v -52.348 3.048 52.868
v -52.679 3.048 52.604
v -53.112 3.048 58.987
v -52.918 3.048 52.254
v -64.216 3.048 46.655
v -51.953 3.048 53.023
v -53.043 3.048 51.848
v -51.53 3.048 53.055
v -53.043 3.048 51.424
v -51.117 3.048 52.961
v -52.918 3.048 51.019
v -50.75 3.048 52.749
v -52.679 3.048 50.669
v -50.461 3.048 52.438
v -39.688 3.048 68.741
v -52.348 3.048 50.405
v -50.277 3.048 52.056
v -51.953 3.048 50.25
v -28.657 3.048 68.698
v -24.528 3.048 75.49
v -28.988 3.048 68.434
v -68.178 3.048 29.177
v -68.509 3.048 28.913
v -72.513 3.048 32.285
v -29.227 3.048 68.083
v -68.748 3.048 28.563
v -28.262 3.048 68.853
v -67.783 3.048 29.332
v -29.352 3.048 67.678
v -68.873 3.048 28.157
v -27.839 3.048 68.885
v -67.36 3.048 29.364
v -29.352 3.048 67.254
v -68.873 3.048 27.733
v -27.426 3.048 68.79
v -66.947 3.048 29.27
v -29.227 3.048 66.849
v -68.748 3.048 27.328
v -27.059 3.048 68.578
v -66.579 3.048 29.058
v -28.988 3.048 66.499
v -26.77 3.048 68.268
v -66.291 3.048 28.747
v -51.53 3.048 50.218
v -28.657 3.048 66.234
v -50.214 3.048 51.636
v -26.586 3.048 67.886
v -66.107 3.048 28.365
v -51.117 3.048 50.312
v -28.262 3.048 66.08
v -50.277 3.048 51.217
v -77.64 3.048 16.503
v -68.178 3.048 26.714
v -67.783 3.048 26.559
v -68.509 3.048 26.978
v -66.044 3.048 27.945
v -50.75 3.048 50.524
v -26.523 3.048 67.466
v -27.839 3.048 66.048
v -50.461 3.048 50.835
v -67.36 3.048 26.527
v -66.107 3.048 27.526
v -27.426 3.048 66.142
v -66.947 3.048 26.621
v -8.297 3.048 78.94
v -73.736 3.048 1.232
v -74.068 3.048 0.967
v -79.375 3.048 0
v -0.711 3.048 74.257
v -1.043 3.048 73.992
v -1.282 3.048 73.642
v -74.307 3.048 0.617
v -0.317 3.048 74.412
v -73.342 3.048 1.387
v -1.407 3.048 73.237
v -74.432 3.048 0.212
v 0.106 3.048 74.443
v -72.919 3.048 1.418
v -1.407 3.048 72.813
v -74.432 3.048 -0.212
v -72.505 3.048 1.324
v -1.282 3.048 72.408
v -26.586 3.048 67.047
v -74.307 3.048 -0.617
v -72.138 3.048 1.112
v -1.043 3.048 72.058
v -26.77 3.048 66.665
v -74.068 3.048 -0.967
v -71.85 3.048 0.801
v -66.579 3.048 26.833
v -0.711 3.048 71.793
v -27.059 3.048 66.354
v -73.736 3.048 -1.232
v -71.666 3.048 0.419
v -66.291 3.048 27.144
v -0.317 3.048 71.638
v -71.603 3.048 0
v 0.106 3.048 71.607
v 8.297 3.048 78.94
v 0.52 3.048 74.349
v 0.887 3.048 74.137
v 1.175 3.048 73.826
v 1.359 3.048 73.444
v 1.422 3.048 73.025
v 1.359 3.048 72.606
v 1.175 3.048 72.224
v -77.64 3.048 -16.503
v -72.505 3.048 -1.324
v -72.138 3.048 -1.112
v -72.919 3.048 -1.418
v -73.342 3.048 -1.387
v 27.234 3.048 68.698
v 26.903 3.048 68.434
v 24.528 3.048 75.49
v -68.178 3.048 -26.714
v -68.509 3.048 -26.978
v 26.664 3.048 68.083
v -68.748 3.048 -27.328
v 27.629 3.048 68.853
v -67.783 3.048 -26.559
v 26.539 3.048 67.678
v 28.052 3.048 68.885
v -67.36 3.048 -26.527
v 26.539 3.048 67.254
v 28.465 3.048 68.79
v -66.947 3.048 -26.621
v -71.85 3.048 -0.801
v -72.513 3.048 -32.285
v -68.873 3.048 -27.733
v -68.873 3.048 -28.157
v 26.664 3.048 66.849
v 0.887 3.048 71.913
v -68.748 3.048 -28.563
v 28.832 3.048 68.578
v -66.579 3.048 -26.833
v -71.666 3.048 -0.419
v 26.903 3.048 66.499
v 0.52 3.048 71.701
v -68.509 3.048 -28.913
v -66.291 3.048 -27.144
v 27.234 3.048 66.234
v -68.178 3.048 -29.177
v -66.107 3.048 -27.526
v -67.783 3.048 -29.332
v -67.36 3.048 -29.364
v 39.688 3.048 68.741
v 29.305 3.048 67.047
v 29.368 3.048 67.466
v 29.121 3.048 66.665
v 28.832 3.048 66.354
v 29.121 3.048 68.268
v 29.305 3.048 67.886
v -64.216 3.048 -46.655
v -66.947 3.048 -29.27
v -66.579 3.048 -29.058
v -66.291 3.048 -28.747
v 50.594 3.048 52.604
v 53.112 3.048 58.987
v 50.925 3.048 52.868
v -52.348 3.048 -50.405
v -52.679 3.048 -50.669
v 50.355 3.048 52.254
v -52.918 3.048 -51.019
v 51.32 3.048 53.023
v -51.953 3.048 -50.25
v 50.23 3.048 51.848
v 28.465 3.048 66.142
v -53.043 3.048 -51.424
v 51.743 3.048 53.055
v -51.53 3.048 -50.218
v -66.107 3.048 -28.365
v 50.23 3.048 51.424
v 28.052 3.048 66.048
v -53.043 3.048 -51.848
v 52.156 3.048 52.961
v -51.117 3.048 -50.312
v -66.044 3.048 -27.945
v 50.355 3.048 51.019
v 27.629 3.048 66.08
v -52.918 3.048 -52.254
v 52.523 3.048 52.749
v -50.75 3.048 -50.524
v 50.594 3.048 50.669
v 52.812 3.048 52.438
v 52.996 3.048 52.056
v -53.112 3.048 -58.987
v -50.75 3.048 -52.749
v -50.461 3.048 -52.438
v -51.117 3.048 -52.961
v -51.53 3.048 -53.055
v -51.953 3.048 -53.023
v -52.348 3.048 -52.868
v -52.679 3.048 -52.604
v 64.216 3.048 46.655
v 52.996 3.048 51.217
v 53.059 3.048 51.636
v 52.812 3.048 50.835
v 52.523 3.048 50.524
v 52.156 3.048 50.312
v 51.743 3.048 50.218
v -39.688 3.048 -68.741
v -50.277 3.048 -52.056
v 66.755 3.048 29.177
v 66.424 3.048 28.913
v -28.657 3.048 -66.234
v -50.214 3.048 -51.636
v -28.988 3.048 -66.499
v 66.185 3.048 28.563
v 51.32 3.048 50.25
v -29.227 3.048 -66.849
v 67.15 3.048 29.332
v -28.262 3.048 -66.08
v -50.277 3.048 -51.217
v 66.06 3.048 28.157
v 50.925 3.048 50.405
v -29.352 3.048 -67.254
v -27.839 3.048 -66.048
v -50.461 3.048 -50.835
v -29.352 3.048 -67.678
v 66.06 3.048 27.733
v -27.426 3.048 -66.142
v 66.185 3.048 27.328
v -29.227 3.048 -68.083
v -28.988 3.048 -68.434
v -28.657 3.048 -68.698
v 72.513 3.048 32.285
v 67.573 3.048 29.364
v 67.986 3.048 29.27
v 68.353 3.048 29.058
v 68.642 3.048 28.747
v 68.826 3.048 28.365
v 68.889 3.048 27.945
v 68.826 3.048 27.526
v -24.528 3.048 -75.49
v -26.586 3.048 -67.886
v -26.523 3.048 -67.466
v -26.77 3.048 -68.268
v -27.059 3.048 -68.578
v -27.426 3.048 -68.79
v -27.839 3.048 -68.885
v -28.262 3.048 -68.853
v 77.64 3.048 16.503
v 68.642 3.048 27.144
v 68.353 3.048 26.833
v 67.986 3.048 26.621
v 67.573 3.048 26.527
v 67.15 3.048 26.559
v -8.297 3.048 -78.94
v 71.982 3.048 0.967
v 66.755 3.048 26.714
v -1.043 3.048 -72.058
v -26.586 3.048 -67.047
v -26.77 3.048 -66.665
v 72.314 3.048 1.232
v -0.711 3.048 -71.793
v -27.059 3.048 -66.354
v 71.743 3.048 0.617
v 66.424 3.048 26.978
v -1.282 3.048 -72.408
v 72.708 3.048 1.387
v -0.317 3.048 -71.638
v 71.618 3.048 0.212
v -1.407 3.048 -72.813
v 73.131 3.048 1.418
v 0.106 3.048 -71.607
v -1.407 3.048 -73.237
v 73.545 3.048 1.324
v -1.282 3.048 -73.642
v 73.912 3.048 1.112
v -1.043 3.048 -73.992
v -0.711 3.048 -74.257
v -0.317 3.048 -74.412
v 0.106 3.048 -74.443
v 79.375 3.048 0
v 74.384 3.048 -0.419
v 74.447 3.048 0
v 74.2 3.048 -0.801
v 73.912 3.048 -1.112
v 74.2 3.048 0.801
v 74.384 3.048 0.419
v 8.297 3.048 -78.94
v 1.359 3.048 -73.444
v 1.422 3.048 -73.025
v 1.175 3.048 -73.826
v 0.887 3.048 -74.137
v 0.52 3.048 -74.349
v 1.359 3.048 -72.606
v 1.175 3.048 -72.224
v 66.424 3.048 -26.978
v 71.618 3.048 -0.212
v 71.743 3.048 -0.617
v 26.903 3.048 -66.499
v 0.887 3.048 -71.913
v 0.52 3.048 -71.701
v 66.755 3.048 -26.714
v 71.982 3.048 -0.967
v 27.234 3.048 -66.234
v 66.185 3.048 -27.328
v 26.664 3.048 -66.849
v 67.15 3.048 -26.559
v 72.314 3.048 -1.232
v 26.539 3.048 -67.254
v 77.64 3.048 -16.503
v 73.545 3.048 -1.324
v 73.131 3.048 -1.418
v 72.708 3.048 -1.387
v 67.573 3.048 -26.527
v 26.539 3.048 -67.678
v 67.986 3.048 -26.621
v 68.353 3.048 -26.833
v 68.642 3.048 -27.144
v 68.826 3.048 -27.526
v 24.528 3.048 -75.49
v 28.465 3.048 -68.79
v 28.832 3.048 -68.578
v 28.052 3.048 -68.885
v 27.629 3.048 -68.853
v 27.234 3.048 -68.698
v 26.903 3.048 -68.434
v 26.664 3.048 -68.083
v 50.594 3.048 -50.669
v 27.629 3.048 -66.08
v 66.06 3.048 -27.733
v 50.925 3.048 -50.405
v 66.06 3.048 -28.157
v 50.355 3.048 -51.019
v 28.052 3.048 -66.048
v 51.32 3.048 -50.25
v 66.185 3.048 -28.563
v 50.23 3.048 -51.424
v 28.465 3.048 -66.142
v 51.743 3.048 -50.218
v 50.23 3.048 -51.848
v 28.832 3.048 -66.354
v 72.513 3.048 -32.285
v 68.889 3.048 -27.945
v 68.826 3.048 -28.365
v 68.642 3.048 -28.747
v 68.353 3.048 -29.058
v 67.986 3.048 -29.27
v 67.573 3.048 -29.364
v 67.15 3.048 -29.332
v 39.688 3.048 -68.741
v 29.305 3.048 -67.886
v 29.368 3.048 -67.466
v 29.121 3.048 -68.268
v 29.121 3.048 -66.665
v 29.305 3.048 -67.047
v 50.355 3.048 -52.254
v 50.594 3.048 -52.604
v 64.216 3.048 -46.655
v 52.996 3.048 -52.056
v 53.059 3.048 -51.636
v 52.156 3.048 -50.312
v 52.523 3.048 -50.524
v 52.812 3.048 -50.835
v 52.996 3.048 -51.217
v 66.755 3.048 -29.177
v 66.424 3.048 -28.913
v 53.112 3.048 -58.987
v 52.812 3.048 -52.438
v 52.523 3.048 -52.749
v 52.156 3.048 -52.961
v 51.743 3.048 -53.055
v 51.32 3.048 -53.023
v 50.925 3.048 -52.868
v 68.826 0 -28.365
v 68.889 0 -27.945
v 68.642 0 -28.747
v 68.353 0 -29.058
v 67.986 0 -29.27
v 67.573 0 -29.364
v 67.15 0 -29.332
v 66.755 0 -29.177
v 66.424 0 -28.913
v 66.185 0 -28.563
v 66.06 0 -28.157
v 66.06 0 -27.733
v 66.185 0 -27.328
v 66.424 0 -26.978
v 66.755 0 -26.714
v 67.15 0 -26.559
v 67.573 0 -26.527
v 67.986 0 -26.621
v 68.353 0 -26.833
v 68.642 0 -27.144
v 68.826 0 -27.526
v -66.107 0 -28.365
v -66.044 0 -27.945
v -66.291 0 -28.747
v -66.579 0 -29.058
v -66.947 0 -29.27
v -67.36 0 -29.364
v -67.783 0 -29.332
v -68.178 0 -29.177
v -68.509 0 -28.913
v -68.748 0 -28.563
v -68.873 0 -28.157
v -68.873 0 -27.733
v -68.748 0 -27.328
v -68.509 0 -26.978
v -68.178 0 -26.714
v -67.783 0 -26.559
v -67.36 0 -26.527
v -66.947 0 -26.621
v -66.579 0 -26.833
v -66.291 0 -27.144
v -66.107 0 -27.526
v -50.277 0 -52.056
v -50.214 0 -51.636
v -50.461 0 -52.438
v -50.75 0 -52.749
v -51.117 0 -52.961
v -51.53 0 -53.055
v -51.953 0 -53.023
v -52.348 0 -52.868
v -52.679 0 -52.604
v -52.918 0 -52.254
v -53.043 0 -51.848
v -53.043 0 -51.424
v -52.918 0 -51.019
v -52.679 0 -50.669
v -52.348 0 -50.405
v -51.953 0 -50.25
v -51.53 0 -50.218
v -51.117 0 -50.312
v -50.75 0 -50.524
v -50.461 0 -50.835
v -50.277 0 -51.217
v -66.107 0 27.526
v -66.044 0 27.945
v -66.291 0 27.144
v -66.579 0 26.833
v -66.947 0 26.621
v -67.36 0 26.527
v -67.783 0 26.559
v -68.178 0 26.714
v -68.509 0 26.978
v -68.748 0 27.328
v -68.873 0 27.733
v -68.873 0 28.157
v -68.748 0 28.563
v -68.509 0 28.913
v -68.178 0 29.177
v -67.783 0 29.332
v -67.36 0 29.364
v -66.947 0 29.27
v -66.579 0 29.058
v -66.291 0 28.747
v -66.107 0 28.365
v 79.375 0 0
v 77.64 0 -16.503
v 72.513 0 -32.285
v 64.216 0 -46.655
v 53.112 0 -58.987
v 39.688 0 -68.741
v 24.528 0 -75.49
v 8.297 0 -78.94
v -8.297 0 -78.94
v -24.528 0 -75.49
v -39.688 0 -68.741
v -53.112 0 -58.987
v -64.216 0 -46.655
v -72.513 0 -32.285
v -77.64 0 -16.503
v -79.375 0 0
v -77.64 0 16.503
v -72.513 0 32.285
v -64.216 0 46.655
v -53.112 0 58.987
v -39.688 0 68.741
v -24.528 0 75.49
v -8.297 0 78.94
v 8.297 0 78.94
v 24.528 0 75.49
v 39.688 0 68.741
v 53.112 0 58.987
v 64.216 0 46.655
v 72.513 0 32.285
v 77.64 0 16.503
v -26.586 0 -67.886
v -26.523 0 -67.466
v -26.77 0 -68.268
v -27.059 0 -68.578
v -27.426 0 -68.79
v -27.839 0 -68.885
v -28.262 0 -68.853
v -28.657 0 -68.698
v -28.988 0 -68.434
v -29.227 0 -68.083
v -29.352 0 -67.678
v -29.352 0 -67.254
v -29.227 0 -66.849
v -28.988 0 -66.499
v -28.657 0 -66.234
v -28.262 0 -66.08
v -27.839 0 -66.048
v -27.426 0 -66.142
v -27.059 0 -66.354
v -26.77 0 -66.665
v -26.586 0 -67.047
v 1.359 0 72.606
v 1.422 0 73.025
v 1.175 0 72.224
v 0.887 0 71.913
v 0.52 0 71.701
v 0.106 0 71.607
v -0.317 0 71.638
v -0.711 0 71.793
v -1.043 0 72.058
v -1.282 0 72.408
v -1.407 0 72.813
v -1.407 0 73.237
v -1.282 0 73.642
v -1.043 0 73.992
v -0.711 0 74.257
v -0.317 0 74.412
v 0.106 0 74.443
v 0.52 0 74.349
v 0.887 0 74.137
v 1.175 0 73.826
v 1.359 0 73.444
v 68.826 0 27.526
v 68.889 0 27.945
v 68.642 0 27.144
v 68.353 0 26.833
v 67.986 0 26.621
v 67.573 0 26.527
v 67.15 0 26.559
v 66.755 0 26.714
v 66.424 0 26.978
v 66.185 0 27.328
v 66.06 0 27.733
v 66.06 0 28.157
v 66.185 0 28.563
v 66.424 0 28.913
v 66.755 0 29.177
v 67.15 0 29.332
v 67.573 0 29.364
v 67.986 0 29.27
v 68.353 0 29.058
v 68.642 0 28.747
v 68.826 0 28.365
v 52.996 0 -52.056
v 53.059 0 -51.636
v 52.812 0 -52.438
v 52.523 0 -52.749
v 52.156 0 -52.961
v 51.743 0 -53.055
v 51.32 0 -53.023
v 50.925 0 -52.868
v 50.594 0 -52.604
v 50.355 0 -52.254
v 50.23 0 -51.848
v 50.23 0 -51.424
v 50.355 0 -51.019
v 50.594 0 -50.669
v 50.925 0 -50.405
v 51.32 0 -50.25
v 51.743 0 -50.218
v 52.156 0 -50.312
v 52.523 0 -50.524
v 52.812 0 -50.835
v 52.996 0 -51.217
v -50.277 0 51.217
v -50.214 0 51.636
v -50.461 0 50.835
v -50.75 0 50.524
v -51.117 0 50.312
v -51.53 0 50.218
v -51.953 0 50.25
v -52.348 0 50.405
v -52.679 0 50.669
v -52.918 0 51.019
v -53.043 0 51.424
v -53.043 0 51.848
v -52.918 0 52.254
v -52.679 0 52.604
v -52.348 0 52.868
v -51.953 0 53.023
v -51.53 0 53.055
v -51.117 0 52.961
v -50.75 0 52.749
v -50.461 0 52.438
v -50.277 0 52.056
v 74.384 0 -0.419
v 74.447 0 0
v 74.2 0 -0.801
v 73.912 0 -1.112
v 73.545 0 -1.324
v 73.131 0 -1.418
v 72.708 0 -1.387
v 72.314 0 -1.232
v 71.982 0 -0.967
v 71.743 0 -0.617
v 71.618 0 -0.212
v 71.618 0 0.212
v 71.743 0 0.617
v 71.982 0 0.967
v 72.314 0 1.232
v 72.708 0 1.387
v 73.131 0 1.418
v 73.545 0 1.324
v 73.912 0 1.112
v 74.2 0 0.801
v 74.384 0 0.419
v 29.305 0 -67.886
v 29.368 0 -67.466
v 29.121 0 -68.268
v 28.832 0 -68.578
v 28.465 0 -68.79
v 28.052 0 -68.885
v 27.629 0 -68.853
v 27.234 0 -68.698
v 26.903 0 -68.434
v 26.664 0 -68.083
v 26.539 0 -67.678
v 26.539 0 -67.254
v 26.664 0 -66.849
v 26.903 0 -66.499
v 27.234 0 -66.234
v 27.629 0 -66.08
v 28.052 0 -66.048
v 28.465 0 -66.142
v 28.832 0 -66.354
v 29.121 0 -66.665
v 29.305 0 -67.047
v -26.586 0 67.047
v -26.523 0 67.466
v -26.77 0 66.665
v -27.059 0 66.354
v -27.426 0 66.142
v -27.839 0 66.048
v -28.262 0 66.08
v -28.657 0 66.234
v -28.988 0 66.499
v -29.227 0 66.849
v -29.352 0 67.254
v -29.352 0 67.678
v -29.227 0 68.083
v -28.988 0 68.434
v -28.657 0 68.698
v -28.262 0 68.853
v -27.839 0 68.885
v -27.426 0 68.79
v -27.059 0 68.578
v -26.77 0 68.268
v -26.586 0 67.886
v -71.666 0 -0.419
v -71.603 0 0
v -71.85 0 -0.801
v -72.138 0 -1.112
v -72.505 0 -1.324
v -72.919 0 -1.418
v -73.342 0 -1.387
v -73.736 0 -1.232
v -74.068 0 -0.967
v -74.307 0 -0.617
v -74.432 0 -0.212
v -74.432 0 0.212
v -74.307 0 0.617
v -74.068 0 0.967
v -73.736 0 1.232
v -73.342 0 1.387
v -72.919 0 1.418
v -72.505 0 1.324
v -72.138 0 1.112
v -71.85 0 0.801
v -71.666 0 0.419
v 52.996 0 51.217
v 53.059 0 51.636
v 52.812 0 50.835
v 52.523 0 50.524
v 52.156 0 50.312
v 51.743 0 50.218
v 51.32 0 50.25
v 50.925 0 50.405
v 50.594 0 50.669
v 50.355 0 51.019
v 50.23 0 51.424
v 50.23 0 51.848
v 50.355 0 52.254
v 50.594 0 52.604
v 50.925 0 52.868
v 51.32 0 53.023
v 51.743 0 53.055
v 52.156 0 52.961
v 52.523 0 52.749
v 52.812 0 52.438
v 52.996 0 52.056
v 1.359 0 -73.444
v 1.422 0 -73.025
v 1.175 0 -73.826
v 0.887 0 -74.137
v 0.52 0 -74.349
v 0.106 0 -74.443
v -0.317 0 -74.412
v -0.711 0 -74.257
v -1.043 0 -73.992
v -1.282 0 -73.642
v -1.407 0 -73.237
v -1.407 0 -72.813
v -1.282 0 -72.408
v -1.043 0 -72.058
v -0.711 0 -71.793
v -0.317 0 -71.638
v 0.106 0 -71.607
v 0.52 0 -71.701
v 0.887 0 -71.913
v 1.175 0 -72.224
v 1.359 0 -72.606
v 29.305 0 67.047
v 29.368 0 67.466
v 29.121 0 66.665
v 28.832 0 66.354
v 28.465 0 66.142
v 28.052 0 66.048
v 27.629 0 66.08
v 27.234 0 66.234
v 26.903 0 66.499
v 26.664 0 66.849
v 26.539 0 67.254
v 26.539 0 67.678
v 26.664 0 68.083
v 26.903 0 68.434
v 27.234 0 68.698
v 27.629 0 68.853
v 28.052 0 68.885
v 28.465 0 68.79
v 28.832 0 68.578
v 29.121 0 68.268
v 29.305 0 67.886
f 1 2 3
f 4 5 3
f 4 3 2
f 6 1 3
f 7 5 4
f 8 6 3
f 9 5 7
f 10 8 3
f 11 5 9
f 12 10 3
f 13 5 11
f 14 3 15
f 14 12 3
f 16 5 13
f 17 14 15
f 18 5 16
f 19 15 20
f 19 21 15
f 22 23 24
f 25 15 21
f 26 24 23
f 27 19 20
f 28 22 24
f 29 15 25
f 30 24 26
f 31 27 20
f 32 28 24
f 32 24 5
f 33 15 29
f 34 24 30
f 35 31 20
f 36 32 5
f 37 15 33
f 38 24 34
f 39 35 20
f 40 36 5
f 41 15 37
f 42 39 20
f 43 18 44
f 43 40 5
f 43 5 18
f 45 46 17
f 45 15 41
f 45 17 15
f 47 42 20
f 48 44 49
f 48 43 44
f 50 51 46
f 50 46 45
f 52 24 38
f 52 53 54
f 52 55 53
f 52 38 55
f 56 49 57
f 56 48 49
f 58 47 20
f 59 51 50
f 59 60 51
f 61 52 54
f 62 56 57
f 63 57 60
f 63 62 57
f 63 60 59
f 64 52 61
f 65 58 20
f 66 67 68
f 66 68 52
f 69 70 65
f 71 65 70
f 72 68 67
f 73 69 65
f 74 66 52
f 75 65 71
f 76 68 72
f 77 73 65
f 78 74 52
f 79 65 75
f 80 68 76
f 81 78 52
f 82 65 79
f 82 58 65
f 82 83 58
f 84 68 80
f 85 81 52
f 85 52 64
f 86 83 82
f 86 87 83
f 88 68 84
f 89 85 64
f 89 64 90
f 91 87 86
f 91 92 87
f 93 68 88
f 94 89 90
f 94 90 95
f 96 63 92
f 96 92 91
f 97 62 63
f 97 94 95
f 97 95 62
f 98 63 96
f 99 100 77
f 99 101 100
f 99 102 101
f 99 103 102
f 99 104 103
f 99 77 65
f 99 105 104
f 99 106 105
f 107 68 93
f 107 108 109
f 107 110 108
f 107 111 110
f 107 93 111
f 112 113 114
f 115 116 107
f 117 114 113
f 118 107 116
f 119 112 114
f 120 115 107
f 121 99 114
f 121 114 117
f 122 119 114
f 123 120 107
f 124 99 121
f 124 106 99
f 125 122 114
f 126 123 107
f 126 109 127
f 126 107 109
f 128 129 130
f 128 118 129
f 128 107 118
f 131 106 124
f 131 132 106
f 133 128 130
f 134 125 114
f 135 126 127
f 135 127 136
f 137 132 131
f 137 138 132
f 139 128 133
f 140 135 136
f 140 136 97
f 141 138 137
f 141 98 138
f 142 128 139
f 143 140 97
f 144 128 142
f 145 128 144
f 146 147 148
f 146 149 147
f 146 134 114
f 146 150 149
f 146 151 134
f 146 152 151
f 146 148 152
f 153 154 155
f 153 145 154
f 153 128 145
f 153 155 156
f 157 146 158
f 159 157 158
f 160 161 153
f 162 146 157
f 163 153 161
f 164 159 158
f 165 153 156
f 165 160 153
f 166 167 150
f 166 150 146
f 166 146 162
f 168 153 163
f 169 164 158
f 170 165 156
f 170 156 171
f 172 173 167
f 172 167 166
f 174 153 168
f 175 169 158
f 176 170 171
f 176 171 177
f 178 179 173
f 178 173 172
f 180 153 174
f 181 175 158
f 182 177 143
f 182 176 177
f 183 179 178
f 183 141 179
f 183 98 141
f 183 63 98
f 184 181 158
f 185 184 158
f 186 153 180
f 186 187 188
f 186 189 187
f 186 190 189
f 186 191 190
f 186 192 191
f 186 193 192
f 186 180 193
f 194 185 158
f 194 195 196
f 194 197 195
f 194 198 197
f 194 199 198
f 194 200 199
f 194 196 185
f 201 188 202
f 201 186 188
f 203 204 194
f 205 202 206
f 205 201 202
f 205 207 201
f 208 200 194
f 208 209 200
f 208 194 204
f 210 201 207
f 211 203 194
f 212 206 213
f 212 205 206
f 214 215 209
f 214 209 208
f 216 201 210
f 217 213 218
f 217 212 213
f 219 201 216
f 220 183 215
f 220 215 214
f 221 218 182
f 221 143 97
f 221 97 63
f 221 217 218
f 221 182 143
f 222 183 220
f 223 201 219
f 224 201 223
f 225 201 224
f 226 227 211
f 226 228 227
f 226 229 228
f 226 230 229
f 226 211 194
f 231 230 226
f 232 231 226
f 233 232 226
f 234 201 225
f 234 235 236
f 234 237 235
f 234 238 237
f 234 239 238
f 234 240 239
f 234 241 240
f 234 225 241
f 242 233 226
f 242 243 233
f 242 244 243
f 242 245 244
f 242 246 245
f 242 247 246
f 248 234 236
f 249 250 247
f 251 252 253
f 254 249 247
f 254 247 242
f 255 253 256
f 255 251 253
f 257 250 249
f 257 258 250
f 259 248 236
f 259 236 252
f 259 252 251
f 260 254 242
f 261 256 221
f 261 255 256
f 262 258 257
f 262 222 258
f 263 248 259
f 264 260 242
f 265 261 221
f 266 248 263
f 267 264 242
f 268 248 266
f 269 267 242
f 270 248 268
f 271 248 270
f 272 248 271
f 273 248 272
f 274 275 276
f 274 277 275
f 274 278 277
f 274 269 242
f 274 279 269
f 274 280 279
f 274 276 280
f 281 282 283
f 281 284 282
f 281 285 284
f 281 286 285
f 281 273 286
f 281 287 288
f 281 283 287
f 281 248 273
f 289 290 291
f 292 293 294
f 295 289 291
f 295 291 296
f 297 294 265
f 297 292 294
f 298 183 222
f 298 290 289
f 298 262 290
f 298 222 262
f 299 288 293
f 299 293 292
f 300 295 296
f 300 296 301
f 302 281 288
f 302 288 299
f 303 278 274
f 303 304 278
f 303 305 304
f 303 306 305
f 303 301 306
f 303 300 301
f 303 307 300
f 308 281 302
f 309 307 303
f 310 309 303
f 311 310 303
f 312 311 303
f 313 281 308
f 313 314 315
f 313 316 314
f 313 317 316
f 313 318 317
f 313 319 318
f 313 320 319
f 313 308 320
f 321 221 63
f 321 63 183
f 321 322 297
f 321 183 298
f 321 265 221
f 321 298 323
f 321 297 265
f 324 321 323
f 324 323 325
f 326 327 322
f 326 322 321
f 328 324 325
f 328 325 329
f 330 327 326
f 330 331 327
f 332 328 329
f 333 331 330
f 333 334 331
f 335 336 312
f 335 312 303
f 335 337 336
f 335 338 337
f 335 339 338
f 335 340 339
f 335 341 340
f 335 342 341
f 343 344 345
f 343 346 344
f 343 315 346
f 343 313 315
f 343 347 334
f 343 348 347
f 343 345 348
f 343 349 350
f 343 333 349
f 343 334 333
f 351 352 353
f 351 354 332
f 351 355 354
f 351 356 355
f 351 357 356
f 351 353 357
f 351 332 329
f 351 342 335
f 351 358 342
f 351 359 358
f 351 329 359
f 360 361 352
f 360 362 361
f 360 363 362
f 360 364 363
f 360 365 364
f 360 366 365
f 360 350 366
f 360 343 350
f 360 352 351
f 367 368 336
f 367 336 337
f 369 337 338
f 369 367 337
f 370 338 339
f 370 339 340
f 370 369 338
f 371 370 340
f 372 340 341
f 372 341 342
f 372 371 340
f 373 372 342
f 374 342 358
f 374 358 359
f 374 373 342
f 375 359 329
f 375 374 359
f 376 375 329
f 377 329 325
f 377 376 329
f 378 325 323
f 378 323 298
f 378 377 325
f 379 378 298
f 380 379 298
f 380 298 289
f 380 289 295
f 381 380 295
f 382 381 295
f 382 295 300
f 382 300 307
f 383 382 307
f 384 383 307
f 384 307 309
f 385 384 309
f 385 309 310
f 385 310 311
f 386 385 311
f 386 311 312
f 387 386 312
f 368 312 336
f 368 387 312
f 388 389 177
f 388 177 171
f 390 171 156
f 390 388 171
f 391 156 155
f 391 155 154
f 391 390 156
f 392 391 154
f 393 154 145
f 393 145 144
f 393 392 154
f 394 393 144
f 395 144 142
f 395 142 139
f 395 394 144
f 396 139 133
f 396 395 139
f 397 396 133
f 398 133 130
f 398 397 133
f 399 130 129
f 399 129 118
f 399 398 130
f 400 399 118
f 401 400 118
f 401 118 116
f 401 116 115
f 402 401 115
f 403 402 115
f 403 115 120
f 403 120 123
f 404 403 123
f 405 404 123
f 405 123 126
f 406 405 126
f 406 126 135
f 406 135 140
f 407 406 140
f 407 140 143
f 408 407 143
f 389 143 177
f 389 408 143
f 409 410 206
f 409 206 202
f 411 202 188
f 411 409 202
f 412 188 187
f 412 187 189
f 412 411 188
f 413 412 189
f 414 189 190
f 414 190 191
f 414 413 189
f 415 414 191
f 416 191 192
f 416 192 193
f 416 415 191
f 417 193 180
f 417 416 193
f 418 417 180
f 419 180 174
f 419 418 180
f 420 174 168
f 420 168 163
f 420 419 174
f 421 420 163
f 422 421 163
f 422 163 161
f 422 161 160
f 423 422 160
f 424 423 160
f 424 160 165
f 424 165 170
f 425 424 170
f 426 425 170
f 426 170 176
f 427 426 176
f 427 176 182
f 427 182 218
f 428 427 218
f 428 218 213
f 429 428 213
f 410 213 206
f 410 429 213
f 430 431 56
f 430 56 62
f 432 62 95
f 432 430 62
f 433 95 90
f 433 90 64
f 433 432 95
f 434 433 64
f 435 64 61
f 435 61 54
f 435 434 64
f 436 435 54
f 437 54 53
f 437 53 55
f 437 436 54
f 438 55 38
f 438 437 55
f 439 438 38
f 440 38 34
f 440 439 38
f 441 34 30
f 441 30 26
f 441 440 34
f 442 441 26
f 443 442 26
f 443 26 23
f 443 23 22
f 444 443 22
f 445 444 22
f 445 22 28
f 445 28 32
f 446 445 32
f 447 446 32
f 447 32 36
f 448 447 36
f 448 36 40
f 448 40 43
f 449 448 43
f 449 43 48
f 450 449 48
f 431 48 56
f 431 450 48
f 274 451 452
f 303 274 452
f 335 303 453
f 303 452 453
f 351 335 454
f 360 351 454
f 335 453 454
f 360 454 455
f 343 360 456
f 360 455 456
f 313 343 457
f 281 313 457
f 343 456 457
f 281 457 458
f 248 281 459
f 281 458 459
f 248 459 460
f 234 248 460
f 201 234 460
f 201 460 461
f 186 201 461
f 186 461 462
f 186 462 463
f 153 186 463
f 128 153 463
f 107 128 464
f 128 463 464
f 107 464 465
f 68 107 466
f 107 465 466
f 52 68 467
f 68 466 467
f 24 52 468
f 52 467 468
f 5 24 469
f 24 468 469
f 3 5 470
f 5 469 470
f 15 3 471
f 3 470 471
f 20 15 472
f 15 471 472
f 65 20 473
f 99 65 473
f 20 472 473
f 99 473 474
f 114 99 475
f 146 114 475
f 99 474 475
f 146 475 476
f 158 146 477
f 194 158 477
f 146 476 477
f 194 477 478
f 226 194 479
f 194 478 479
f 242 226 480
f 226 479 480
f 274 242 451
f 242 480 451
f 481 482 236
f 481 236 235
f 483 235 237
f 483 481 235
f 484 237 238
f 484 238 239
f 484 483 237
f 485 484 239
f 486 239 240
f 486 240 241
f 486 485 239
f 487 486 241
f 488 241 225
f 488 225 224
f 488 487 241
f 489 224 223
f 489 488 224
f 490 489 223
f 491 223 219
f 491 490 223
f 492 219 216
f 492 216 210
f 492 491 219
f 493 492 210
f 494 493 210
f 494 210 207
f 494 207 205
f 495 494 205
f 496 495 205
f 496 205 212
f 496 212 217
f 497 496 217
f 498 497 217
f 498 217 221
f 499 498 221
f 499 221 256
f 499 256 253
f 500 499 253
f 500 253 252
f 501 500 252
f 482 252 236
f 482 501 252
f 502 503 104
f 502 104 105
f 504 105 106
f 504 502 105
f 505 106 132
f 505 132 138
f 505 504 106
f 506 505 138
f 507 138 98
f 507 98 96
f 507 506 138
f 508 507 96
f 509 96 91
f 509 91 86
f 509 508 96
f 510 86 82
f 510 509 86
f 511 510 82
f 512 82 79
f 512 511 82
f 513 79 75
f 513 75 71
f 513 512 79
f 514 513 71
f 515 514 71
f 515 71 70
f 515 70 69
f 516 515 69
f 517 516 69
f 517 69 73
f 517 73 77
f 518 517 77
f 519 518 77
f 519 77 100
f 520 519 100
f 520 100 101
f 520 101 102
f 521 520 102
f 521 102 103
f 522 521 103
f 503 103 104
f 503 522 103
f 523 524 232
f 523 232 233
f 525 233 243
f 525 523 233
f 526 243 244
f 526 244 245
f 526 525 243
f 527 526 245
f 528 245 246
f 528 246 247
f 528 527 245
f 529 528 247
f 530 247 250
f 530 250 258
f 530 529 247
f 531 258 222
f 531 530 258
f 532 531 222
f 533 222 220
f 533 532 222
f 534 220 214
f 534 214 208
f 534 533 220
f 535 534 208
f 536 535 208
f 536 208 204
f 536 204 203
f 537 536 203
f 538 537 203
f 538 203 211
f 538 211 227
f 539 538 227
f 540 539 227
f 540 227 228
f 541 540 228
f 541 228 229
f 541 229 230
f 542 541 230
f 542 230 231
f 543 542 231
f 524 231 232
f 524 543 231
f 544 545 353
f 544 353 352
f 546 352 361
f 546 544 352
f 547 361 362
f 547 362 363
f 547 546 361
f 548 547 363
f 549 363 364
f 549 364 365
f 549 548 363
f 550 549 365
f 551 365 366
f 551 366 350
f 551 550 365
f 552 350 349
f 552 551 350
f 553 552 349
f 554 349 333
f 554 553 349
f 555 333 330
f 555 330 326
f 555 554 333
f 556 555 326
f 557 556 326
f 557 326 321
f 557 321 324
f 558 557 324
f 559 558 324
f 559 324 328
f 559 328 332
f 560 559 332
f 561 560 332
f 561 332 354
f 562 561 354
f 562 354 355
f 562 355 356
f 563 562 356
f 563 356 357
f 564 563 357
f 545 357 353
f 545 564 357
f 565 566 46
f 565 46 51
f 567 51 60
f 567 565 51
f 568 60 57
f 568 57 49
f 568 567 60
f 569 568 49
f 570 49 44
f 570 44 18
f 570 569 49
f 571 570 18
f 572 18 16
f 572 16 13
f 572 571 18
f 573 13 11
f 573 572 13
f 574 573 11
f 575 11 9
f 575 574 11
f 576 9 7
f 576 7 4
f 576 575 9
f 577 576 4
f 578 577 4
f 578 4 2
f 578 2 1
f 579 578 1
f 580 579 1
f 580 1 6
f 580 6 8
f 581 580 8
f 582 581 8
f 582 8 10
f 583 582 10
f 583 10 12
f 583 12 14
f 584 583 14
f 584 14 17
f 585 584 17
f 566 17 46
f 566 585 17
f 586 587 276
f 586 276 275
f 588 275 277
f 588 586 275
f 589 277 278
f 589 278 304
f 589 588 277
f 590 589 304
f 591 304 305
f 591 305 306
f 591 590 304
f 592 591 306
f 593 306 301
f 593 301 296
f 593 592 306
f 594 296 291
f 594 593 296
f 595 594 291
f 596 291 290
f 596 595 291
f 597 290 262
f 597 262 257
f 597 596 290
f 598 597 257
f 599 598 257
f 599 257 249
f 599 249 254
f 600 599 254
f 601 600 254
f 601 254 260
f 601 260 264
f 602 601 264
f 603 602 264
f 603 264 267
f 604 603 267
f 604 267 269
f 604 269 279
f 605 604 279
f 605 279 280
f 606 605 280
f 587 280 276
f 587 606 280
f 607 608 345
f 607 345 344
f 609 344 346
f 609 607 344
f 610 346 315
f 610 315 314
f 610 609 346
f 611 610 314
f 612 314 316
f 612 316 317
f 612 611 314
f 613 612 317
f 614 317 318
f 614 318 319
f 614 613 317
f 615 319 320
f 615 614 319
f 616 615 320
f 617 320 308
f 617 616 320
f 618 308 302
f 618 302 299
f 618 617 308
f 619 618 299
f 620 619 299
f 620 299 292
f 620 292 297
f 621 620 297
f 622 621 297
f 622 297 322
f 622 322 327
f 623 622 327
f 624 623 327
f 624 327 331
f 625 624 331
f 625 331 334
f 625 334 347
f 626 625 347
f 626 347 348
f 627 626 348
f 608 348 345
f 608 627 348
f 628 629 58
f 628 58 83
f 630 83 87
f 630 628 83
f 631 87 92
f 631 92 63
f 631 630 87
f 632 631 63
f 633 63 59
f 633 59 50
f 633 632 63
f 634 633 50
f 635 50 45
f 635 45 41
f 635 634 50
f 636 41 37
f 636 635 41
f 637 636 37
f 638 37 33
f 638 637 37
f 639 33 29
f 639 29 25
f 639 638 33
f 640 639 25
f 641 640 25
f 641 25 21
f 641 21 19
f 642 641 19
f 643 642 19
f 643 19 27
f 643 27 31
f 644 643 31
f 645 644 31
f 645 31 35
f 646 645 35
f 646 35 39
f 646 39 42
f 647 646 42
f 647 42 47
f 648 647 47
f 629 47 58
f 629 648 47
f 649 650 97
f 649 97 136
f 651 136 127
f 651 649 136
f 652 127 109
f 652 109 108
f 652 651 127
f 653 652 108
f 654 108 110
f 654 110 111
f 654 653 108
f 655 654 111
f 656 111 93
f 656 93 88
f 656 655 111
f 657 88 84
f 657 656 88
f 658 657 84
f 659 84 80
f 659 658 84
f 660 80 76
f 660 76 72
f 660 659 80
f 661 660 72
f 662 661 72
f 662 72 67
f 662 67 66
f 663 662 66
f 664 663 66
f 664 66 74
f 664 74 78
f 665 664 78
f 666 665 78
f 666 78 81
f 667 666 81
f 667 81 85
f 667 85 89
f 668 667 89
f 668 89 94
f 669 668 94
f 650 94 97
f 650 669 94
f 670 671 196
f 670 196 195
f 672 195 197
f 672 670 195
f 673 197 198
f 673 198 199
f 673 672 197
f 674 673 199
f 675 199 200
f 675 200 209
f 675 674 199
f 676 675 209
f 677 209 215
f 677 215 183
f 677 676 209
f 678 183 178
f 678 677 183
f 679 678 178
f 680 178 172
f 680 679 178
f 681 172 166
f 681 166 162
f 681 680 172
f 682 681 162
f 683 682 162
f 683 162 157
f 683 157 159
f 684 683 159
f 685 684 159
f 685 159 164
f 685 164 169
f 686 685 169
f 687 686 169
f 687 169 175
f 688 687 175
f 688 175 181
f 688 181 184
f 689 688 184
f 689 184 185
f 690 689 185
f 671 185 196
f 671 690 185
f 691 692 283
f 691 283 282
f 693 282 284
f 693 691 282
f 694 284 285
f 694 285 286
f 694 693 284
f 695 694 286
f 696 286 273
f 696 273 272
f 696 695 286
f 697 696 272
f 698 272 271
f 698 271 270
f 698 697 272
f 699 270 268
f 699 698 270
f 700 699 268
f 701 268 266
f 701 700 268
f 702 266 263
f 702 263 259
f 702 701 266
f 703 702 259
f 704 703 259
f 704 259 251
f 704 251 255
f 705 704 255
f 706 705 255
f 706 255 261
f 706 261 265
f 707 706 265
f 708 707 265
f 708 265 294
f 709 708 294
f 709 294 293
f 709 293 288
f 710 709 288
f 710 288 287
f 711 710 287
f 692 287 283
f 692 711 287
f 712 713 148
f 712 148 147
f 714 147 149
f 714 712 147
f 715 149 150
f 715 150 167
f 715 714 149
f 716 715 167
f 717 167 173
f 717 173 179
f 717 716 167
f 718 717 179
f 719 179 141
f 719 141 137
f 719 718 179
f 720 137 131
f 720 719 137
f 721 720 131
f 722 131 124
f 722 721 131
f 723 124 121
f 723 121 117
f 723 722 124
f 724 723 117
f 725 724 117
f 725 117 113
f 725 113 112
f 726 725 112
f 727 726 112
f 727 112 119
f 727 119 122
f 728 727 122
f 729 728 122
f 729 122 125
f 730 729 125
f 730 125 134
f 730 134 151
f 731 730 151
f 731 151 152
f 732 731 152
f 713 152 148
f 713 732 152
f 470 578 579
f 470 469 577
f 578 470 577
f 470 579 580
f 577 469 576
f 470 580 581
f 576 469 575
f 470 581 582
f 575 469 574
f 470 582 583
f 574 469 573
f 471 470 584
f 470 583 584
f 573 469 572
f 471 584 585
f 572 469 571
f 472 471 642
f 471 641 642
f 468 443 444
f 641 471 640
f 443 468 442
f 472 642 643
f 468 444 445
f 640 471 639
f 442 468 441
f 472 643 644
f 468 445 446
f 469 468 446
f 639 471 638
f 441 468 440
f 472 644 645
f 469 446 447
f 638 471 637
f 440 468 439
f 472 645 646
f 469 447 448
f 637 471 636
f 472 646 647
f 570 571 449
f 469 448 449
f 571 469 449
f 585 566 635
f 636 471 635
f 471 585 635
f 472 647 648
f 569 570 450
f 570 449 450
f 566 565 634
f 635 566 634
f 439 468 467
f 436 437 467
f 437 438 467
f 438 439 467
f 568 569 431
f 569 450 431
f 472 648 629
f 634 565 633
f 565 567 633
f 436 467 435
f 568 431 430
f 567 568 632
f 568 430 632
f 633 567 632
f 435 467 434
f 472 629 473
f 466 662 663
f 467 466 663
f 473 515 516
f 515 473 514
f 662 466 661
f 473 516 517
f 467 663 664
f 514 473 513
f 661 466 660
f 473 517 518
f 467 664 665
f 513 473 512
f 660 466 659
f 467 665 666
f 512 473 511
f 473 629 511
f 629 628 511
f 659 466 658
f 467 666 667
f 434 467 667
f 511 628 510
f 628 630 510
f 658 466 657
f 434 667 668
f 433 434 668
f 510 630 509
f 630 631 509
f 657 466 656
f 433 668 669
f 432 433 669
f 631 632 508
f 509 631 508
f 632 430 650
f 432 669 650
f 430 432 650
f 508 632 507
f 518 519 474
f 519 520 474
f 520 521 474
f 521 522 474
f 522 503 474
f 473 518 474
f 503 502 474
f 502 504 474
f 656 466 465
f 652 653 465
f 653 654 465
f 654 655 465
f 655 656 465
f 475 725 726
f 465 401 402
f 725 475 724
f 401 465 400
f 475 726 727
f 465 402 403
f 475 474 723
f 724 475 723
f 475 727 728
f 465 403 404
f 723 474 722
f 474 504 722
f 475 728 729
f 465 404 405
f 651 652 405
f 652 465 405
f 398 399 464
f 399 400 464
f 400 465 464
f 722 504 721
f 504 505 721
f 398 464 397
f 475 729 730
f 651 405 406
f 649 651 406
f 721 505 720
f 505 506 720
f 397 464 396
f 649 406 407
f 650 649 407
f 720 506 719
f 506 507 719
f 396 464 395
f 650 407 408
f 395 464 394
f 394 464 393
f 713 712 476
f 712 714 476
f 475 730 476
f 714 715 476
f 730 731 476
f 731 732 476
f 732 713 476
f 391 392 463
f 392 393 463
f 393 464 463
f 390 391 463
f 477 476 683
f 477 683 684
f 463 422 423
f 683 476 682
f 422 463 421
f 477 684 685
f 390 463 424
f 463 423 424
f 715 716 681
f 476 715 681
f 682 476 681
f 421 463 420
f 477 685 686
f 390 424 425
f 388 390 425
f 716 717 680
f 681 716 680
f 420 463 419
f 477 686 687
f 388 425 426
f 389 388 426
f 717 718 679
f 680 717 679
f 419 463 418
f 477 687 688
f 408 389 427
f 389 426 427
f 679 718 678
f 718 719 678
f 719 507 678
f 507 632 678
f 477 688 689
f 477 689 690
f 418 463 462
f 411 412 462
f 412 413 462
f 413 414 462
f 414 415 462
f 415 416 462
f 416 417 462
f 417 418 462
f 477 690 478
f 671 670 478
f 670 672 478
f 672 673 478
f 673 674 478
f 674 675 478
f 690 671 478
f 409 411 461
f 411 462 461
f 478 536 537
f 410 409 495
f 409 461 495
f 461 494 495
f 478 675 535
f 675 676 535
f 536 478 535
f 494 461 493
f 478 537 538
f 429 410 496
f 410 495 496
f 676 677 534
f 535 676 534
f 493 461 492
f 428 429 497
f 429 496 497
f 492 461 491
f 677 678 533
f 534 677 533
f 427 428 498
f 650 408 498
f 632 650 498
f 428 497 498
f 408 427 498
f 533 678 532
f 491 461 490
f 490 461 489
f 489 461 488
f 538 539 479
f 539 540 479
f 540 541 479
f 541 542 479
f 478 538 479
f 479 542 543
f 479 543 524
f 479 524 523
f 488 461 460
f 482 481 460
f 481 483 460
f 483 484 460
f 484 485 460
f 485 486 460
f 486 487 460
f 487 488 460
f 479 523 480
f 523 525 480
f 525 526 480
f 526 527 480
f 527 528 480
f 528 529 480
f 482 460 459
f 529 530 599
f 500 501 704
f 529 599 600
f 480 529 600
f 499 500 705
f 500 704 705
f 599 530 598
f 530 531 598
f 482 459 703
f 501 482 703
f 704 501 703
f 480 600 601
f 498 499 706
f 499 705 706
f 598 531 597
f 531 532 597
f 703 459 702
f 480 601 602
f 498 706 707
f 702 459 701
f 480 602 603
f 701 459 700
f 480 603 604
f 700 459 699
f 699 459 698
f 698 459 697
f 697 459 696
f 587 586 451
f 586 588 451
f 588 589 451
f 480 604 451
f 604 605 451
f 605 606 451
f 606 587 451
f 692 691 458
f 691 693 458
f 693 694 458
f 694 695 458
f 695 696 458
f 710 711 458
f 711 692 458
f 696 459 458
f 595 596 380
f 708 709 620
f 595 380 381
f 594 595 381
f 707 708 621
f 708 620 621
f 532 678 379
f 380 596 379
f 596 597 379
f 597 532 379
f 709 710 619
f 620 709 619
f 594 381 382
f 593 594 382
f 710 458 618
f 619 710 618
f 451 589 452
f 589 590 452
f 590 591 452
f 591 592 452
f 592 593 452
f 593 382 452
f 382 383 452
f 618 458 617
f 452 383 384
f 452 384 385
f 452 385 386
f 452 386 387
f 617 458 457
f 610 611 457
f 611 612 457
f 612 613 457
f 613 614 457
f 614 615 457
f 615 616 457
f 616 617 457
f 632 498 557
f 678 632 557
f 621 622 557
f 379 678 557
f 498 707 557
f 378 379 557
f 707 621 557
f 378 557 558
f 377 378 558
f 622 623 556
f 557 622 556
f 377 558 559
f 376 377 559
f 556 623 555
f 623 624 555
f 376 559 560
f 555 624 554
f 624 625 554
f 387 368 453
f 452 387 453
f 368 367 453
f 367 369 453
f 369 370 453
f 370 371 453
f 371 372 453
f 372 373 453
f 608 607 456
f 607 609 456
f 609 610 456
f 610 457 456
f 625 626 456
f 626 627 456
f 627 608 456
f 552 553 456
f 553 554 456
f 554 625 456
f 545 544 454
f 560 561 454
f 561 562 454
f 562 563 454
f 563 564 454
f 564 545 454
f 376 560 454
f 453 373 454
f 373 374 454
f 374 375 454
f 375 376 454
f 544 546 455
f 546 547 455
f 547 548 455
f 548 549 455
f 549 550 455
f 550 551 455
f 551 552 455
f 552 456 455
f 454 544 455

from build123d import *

# Parameters (mm, degrees)
SKETCH1_R           = 79.375
SKETCH1_R_2         = 1.4224
BOSS_EXTRUDE1_DEPTH = 3.048


with BuildPart() as part:
    # Sketch1 → Boss-Extrude1 (new body)
    with BuildSketch(Plane(origin=(0, 0, 0), x_dir=(1, 0, 0), z_dir=(0, 1, 0))):
        Circle(SKETCH1_R)
        with Locations((0, 73.025)):
            Circle(SKETCH1_R_2, mode=Mode.SUBTRACT)
        with Locations((27.945457648, 67.466302862)):
            Circle(SKETCH1_R_2, mode=Mode.SUBTRACT)
        with Locations((51.636472696, 51.636472696)):
            Circle(SKETCH1_R_2, mode=Mode.SUBTRACT)
        with Locations((67.466302862, 27.945457648)):
            Circle(SKETCH1_R_2, mode=Mode.SUBTRACT)
        with Locations((73.025, 0)):
            Circle(SKETCH1_R_2, mode=Mode.SUBTRACT)
        with Locations((67.466302862, -27.945457648)):
            Circle(SKETCH1_R_2, mode=Mode.SUBTRACT)
        with Locations((51.636472696, -51.636472696)):
            Circle(SKETCH1_R_2, mode=Mode.SUBTRACT)
        with Locations((27.945457648, -67.466302862)):
            Circle(SKETCH1_R_2, mode=Mode.SUBTRACT)
        with Locations((0, -73.025)):
            Circle(SKETCH1_R_2, mode=Mode.SUBTRACT)
        with Locations((-27.945457648, -67.466302862)):
            Circle(SKETCH1_R_2, mode=Mode.SUBTRACT)
        with Locations((-51.636472696, -51.636472696)):
            Circle(SKETCH1_R_2, mode=Mode.SUBTRACT)
        with Locations((-67.466302862, -27.945457648)):
            Circle(SKETCH1_R_2, mode=Mode.SUBTRACT)
        with Locations((-73.025, 0)):
            Circle(SKETCH1_R_2, mode=Mode.SUBTRACT)
        with Locations((-67.466302862, 27.945457648)):
            Circle(SKETCH1_R_2, mode=Mode.SUBTRACT)
        with Locations((-51.636472696, 51.636472696)):
            Circle(SKETCH1_R_2, mode=Mode.SUBTRACT)
        with Locations((-27.945457648, 67.466302862)):
            Circle(SKETCH1_R_2, mode=Mode.SUBTRACT)
    extrude(amount=BOSS_EXTRUDE1_DEPTH)


solid = part.part
